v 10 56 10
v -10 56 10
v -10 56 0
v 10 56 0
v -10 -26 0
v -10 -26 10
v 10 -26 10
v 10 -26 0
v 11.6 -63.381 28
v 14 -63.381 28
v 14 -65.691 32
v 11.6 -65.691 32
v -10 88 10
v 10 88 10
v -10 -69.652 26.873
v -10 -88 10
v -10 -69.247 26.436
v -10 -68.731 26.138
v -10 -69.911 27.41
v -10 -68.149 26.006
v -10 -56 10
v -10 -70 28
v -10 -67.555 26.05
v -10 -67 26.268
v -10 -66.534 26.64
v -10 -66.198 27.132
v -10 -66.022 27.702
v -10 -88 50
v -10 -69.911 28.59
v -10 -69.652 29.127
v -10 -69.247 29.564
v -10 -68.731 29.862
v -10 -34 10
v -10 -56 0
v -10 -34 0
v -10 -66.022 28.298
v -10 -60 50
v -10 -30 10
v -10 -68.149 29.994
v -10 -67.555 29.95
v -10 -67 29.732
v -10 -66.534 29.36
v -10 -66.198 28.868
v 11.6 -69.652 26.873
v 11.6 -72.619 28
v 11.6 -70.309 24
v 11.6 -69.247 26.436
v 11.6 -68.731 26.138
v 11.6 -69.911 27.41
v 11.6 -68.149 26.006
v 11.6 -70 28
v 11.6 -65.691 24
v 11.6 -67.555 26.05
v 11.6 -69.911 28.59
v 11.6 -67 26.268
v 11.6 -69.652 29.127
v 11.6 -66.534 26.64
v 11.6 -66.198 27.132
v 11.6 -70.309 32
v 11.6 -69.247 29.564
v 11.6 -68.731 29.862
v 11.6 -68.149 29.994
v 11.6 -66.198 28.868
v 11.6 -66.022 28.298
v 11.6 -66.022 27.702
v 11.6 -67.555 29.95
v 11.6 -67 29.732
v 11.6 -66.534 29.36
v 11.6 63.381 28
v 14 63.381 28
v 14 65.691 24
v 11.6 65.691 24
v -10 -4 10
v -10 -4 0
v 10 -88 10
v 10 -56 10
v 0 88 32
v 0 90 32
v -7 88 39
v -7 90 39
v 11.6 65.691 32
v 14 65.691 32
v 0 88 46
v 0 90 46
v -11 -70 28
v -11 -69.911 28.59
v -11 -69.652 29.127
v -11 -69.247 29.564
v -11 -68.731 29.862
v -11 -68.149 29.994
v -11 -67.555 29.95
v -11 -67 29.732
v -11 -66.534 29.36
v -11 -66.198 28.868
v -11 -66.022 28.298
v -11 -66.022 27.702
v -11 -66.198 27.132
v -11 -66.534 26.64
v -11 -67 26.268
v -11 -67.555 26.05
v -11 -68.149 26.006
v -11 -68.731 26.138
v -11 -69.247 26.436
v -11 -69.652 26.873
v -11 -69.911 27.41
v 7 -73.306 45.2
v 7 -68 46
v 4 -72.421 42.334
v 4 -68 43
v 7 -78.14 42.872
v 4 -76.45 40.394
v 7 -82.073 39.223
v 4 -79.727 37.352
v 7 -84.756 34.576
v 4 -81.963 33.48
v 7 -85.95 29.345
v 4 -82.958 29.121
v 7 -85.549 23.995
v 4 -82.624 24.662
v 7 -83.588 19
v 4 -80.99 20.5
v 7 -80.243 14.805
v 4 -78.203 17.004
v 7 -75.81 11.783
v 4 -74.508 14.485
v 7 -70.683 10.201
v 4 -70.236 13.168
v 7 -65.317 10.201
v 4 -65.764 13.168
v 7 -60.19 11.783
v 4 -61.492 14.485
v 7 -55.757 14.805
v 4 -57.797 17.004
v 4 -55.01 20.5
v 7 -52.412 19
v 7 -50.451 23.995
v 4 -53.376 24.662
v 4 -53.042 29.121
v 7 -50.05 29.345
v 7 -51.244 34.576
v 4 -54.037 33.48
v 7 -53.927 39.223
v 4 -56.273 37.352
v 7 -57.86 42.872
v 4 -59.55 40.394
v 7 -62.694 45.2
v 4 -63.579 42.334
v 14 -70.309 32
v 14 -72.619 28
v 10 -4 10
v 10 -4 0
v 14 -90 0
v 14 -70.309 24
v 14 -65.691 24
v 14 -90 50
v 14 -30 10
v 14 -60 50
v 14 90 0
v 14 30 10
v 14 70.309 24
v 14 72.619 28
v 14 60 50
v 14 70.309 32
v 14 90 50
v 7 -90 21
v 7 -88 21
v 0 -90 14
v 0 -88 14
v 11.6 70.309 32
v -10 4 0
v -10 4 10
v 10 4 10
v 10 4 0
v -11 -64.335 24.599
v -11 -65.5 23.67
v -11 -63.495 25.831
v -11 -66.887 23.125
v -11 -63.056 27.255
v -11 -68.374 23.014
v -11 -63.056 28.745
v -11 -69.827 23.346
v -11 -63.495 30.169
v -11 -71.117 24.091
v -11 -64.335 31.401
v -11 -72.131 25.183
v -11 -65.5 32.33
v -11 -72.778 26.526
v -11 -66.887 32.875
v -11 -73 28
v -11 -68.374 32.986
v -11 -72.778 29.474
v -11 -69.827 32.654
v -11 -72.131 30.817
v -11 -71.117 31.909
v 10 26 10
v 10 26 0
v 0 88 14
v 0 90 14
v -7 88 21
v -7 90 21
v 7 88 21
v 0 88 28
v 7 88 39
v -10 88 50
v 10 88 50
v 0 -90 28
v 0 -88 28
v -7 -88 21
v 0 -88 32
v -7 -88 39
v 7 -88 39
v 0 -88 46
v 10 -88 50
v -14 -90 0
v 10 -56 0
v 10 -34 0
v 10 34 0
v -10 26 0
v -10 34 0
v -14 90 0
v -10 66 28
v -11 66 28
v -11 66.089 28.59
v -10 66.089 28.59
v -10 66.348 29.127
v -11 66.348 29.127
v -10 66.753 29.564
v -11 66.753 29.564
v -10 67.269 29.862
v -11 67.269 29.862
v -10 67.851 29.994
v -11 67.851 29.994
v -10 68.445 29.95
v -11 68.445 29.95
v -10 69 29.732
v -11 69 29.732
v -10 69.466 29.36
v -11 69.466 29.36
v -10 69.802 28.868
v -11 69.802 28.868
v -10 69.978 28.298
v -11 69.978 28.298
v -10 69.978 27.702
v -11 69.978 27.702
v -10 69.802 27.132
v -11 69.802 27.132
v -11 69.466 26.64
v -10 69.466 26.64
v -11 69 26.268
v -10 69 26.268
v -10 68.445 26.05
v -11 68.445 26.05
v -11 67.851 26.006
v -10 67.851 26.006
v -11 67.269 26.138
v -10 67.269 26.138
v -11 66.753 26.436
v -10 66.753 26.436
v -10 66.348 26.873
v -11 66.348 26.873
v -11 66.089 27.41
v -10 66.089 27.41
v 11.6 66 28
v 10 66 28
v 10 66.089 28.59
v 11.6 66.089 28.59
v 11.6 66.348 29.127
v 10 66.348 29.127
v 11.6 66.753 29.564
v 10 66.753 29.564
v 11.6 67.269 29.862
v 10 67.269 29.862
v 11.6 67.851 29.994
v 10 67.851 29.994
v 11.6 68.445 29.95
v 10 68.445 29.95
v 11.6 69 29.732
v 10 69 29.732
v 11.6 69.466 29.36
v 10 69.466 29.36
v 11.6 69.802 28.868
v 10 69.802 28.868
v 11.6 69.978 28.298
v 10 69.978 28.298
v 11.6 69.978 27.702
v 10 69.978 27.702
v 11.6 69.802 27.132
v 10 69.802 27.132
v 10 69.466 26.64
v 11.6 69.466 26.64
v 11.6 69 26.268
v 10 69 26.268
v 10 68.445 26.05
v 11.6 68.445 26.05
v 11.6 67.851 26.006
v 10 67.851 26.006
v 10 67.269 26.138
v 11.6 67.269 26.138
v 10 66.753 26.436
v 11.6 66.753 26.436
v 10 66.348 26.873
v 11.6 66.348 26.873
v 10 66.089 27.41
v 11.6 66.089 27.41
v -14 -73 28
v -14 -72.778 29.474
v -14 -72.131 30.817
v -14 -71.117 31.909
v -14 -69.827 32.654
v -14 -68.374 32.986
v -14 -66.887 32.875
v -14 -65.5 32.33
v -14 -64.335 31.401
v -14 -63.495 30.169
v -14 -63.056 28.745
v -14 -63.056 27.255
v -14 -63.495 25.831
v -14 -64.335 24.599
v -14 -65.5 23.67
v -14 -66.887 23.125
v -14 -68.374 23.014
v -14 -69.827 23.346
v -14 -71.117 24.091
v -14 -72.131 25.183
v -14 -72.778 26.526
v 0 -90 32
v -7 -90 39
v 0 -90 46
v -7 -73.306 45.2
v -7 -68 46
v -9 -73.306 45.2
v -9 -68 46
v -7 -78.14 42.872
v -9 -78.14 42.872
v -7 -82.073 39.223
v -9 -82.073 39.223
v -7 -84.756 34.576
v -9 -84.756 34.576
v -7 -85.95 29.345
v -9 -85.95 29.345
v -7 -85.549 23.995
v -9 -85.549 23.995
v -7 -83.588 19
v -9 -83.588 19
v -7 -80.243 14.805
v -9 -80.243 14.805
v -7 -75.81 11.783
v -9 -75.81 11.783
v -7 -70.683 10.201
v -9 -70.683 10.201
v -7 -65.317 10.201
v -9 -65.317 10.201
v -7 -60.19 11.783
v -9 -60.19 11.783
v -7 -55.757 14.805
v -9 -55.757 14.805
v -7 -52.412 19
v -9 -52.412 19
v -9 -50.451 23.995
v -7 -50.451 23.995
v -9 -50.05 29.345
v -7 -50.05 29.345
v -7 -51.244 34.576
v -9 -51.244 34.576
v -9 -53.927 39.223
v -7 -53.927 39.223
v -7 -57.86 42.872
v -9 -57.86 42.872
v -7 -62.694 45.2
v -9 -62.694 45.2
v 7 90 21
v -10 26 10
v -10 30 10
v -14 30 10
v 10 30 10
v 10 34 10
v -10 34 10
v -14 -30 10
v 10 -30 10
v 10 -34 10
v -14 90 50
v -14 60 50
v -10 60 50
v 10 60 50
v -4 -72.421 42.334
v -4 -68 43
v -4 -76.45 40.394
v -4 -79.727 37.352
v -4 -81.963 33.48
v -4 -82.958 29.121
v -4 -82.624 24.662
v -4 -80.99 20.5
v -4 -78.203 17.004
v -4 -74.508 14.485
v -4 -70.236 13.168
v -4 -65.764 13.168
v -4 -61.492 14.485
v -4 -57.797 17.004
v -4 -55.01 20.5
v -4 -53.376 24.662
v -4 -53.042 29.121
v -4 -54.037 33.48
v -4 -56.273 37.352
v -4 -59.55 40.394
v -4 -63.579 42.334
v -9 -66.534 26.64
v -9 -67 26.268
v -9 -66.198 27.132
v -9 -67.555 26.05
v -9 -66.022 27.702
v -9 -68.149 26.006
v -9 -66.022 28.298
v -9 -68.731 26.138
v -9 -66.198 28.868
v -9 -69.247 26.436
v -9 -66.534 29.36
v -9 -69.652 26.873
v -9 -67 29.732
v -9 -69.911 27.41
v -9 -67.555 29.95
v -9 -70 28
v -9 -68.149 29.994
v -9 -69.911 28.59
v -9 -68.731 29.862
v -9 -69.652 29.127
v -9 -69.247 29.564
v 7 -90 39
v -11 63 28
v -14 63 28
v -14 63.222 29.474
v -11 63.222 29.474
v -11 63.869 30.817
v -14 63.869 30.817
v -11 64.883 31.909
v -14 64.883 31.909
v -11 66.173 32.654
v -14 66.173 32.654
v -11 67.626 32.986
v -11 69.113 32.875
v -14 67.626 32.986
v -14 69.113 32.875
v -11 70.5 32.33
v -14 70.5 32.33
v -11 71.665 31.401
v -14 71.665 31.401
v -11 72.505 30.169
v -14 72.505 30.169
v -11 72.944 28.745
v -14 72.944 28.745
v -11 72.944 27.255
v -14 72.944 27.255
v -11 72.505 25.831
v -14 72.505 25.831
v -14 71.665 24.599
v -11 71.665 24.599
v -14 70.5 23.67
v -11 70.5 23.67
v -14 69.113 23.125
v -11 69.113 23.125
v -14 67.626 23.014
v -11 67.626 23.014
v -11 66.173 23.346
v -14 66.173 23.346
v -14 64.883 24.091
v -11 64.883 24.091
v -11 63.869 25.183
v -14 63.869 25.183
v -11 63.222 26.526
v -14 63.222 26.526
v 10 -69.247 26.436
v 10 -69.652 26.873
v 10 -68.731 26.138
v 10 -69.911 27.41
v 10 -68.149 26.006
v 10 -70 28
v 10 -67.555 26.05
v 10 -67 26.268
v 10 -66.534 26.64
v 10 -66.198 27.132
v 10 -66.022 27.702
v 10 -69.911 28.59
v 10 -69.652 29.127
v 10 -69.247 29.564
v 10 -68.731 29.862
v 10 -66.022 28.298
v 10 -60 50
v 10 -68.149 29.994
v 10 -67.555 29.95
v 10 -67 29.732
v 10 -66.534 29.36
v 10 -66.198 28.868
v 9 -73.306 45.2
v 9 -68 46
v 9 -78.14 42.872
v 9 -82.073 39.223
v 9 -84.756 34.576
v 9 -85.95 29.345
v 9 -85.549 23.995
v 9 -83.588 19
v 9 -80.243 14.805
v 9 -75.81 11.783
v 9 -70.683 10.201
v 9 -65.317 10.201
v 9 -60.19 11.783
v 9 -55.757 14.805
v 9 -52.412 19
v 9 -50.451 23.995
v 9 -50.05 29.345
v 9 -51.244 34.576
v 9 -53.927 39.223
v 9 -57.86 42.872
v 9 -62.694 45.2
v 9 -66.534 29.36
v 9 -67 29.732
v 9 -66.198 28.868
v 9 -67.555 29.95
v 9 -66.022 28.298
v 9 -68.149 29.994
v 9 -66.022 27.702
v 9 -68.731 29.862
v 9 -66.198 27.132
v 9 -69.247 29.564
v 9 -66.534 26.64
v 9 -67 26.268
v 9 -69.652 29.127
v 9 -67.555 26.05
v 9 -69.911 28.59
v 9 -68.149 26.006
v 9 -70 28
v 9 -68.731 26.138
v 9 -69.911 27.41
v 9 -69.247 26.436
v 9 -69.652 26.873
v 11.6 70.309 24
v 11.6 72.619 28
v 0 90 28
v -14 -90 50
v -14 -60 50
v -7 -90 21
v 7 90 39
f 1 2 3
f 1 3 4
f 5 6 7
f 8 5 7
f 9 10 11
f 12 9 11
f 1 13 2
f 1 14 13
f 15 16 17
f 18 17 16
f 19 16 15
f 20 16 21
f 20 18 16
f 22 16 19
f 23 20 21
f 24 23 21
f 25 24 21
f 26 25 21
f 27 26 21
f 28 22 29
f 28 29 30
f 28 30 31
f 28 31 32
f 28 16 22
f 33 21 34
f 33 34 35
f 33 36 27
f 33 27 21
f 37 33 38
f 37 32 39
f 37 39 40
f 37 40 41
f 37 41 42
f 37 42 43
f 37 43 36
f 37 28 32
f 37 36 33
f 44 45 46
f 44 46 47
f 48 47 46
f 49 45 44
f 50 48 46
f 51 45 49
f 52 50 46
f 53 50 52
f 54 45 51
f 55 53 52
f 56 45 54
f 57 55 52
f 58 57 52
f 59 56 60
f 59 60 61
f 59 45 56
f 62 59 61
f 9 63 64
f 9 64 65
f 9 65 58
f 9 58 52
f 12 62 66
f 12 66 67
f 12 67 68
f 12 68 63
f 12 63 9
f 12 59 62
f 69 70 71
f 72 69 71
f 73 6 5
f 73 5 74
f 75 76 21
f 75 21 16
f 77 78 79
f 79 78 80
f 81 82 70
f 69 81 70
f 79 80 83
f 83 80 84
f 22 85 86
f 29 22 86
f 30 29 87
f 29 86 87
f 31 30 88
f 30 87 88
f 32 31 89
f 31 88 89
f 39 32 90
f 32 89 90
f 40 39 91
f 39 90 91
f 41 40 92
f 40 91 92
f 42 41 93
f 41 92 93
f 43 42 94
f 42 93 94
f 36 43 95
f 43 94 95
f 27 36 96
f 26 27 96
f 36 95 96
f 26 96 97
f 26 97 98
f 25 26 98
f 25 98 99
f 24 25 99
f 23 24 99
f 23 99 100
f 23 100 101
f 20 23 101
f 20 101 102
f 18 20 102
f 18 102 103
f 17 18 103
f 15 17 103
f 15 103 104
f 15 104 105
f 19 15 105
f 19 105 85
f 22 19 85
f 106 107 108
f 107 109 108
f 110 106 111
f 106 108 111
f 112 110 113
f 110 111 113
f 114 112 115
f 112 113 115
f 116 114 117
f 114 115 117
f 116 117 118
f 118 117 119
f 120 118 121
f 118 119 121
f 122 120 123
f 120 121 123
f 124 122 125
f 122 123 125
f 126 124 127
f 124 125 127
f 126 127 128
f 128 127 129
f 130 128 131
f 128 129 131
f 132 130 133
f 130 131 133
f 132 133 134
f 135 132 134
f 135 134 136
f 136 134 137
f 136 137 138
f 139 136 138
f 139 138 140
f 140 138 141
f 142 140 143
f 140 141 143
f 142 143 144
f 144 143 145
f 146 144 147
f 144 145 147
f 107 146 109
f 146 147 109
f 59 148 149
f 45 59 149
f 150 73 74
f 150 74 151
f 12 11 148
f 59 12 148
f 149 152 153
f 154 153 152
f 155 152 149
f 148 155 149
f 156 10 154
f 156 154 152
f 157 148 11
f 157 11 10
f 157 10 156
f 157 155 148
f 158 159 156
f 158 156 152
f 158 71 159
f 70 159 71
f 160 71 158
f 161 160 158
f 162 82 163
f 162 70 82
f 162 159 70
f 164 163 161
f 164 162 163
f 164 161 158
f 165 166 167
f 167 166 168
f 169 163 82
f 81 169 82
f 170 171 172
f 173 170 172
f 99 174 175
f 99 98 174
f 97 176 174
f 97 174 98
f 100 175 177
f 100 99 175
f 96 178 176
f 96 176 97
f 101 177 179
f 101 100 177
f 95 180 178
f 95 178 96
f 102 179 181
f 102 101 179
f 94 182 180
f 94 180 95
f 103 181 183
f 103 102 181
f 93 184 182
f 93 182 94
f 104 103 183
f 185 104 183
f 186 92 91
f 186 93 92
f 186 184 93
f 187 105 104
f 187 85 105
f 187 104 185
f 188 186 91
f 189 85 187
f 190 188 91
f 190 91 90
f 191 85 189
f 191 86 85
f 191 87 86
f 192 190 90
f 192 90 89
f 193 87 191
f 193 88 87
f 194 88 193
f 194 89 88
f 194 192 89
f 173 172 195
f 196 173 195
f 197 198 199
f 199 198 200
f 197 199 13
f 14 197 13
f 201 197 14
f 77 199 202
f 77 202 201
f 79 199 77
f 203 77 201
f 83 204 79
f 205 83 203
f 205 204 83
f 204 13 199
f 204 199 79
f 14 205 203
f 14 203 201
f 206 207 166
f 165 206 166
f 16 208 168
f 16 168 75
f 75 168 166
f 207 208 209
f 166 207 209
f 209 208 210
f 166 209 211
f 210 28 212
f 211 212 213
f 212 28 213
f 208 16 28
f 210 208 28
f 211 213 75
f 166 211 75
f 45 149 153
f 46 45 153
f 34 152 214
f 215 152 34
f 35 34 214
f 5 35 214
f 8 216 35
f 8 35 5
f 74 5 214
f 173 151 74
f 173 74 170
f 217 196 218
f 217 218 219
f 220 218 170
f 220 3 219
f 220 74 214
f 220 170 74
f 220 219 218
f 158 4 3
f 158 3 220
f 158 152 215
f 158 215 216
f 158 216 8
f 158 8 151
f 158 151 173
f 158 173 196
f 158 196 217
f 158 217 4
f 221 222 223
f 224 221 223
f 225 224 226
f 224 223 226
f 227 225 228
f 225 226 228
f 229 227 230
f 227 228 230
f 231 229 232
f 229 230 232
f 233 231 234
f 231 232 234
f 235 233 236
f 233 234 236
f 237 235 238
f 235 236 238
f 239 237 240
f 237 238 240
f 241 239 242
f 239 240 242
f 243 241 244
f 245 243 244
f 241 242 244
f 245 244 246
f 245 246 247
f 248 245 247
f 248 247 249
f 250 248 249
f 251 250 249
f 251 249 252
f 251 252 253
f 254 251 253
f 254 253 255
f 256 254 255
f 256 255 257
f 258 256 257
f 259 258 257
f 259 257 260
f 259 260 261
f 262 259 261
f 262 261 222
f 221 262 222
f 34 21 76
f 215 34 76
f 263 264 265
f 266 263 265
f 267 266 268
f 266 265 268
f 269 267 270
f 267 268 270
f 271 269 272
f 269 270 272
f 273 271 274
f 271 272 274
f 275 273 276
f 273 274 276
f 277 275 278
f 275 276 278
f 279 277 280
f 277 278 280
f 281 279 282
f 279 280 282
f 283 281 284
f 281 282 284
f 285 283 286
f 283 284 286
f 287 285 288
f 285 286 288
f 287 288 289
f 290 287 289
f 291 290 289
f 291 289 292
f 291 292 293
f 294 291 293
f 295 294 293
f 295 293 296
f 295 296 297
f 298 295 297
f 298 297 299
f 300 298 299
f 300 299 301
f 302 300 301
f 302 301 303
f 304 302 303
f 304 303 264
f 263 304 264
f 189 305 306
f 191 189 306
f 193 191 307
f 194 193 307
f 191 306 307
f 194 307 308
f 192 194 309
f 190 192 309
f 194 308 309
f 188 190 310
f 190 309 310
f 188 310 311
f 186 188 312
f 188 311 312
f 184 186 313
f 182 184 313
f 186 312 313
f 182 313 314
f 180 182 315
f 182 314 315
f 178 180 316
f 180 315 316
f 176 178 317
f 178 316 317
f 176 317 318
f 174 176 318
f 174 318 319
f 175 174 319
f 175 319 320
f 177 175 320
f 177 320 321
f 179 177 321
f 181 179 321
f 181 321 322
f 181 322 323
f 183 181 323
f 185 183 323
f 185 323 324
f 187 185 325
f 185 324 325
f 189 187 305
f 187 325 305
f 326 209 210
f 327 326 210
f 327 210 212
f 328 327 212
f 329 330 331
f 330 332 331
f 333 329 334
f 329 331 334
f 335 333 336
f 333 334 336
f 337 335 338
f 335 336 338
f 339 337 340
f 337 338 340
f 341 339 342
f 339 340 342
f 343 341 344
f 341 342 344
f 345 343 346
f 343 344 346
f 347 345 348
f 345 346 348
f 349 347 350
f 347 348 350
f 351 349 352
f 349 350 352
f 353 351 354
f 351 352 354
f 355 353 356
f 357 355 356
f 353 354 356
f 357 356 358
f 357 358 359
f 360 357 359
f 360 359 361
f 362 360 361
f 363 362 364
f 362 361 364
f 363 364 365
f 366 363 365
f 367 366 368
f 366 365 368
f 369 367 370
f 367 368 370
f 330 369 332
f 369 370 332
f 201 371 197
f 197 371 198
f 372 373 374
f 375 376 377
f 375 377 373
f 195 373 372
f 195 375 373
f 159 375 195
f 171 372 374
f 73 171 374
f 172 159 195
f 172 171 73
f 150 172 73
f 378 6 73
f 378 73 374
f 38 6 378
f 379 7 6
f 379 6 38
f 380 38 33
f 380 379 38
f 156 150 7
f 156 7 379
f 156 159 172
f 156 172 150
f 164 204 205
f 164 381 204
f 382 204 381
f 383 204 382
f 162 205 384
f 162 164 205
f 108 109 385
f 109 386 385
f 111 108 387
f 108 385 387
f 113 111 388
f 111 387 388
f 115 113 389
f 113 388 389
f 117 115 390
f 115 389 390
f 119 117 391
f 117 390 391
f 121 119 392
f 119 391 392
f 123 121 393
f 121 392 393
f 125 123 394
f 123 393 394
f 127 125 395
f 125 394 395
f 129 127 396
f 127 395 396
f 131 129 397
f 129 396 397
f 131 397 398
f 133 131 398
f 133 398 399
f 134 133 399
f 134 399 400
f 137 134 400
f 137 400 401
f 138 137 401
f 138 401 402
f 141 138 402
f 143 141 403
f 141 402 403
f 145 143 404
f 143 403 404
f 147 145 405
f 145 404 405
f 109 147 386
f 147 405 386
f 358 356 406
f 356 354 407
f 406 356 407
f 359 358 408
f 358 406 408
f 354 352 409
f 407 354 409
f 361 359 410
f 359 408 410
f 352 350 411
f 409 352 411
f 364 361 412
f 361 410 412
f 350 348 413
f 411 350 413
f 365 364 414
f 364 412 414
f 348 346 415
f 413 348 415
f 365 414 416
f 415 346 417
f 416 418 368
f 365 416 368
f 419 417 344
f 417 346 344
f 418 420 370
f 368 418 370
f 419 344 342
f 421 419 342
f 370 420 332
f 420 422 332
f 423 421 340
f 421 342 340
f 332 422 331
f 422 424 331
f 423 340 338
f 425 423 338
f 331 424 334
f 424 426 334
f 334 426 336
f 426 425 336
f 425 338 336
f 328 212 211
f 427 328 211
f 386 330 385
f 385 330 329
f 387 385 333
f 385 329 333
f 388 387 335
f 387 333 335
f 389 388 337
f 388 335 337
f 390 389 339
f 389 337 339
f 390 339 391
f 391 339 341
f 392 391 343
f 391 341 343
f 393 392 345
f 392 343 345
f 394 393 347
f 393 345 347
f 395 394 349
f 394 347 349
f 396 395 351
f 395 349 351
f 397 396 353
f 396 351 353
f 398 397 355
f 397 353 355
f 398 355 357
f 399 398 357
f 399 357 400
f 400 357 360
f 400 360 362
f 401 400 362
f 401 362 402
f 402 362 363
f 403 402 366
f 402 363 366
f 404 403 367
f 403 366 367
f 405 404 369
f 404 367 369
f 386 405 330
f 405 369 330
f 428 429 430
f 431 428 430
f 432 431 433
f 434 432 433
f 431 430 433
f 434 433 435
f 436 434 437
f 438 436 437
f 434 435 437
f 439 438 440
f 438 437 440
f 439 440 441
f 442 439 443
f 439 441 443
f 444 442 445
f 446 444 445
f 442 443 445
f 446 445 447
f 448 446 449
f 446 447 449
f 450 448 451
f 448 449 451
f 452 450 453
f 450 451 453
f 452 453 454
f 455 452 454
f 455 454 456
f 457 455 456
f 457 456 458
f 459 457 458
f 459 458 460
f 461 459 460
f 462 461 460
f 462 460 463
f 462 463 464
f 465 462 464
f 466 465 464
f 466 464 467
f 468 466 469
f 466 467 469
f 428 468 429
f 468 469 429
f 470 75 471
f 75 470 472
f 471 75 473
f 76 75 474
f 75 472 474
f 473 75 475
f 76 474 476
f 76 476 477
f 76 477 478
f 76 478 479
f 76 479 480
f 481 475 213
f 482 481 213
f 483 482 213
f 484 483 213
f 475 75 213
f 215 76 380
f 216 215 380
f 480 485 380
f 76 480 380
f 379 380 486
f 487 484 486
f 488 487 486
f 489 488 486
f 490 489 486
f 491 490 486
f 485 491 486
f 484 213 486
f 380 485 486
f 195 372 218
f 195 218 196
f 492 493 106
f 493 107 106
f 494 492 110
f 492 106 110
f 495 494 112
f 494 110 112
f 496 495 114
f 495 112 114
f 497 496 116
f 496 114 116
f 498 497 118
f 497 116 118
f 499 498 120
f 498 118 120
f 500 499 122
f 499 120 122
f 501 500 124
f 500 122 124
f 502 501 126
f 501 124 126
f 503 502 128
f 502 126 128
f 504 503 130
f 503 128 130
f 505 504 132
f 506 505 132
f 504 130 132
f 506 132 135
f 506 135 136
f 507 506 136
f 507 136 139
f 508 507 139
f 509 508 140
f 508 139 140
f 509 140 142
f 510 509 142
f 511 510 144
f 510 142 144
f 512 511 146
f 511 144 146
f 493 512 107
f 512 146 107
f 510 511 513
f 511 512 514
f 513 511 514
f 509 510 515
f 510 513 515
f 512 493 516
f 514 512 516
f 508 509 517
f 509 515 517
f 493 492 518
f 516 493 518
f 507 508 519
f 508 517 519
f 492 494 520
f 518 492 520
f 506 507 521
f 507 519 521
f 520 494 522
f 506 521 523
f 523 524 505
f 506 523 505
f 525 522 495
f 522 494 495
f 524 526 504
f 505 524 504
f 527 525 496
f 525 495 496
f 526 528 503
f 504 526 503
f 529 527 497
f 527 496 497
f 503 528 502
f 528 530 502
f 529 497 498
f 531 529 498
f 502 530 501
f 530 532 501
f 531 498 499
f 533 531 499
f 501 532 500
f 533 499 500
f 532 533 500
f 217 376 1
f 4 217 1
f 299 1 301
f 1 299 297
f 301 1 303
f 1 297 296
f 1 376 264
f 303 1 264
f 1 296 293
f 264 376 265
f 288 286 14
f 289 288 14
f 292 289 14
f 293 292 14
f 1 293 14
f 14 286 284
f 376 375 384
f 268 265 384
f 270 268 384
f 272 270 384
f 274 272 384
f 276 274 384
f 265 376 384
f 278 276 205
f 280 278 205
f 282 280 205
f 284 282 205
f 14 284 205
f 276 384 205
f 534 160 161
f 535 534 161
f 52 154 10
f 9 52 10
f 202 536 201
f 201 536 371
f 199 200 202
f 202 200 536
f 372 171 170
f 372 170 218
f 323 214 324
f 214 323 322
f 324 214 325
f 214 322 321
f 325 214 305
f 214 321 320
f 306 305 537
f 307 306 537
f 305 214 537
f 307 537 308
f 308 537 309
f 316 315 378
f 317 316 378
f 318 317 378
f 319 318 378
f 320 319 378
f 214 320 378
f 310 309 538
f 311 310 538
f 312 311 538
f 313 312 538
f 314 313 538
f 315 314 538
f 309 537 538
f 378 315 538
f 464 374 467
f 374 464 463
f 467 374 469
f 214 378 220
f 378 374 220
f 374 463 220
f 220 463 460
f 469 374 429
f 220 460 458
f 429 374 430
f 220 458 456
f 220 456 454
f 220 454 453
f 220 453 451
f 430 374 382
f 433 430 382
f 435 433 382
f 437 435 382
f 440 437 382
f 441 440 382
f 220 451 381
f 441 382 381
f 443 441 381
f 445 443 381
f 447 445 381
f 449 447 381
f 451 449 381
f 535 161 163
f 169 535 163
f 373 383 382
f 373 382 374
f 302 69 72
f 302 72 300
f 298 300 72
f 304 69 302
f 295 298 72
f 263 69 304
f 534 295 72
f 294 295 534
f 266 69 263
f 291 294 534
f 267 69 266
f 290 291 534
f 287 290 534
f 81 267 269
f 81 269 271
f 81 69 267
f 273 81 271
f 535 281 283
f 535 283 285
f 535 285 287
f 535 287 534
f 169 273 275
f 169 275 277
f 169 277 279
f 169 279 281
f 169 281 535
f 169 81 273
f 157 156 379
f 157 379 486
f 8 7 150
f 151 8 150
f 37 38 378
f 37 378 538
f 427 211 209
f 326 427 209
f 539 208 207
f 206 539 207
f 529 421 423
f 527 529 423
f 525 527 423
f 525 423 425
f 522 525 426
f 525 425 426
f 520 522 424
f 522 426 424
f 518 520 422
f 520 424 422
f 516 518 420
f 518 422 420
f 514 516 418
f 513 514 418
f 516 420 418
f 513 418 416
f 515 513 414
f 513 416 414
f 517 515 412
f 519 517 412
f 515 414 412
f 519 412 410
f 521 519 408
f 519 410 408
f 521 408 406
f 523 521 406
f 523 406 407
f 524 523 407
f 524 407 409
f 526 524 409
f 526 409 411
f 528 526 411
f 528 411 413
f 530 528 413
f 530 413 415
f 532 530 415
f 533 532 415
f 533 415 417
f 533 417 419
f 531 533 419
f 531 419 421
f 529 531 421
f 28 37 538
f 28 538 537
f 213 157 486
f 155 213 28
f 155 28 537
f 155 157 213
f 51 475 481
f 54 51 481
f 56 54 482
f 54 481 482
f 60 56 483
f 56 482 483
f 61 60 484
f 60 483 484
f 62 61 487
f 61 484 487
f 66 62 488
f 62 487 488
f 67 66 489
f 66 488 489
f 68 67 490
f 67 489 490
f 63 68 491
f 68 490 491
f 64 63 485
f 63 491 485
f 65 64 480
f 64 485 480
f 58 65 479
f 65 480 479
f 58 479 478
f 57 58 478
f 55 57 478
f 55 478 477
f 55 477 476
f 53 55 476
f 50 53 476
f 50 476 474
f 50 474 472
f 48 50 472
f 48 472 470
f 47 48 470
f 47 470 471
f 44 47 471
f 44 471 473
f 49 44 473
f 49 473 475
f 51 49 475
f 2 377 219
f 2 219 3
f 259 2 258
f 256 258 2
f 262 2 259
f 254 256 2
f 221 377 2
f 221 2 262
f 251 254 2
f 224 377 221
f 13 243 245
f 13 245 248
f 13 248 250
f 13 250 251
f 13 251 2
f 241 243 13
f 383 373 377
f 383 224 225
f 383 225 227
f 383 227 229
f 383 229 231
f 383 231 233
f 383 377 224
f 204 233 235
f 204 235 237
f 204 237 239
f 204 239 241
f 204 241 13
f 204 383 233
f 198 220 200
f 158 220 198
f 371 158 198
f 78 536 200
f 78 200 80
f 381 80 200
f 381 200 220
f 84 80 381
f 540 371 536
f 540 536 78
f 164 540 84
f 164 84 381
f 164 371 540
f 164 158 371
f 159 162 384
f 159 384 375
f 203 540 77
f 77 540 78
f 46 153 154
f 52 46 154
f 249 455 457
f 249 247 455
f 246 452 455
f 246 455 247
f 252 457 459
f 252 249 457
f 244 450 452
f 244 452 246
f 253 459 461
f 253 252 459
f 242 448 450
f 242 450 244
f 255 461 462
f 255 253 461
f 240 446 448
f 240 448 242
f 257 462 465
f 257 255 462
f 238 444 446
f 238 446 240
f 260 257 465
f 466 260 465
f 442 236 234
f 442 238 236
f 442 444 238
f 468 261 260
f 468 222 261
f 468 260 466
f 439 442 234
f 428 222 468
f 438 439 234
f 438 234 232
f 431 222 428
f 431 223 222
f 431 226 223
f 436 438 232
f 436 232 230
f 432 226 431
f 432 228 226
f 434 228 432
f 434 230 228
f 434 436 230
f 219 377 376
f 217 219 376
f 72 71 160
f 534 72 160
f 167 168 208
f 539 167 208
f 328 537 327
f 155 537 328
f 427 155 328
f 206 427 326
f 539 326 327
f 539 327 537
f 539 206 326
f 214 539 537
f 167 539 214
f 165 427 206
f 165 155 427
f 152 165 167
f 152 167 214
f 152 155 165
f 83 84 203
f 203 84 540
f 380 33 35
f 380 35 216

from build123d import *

# Parameters (mm, degrees)
F0_R      = 15
F1_DEPTH  = 14
F2_W      = 20
F2_H      = 30
F3_DEPTH  = 40
F2_H_2    = 58
F2_H_3    = 28
F4_DEPTH  = 40
F9_D      = 4
F9_2_D    = 4
F10_W     = 20
F10_H     = 22
F11_DEPTH = 10
F12_DEPTH = 2.4
F13_R     = 5
F14_DEPTH = 3
F16_DEPTH = 180.001


with BuildPart() as f1:
    # F0 (on Right) → F1 (new body, symmetric)
    with BuildSketch(Plane.YZ):
        Polygon((-90, 0), (0, 0), (90, 0), (90, 50), (60, 50), (30, 10), (0, 10), (-30, 10), (-60, 50), (-90, 50), align=None)
        with Locations((-68, 28)):
            Circle(F0_R, mode=Mode.SUBTRACT)
        with Locations((-68, 28)):
            Circle(F0_R)
    extrude(amount=F1_DEPTH, both=True)

    # F2 (on face) → F3 (cut, through all)
    with BuildSketch(Plane.XY.offset(50)):
        with Locations((0, -45)):
            Rectangle(F2_W, F2_H)
    extrude(amount=-F3_DEPTH, mode=Mode.SUBTRACT)

    # F2 (on face) → F4 (cut, through all)
    with BuildSketch(Plane.XY.offset(50)):
        with Locations((0, 59)):
            Rectangle(F2_W, F2_H_2)
        with Locations((0, -74)):
            Rectangle(F2_W, F2_H_3)
    extrude(amount=-F4_DEPTH, mode=Mode.SUBTRACT)

    # F9 (through all)
    with Locations(Plane.YZ.offset(14)):
        with Locations((-68, 28), (68, 28)):
            Hole(F9_D / 2)

    # F10 (on face) → F11 (cut, through all)
    with BuildSketch(Plane.XY.offset(10)):
        with Locations((0, 15)):
            Rectangle(F10_W, F10_H)
        with Locations((0, -15)):
            Rectangle(F10_W, F10_H)
        with Locations((0, -45)):
            Rectangle(F10_W, F10_H)
        with Locations((0, 45)):
            Rectangle(F10_W, F10_H)
    extrude(amount=-F11_DEPTH, mode=Mode.SUBTRACT)

    # F8 (on face) → F12 (cut, through all)
    with BuildSketch(Plane.YZ.offset(14)):
        Polygon((-70.3094010768, 24), (-65.6905989232, 24), (-63.3811978465, 28), (-65.6905989232, 32), (-70.3094010768, 32), (-72.6188021535, 28), align=None)
        Polygon((70.3094010768, 32), (65.6905989232, 32), (63.3811978465, 28), (65.6905989232, 24), (70.3094010768, 24), (72.6188021535, 28), align=None)
    extrude(amount=-F12_DEPTH, mode=Mode.SUBTRACT)

    # F13 (on face) → F14 (cut)
    with BuildSketch(Plane(origin=(-14, 0, 0), x_dir=(0, -1, 0), z_dir=(-1, 0, 0))):
        with Locations((68, 28)):
            Circle(F13_R)
        with Locations((-68, 28)):
            Circle(F13_R)
    extrude(amount=-F14_DEPTH, mode=Mode.SUBTRACT)

    # F15 (on face) → F16 (cut, through all)
    with BuildSketch(Plane(origin=(0, 90, 0), x_dir=(-1, 0, 0), z_dir=(0, 1, 0))):
        Polygon((-7, 39), (0, 32), (7, 39), (0, 46), align=None)
        Polygon((7, 21), (0, 28), (-7, 21), (0, 14), align=None)
    extrude(amount=-F16_DEPTH, mode=Mode.SUBTRACT)


with BuildPart() as f7:
    # F6 (on plane+point) → F7 (revolve)
    with BuildSketch(Plane.XZ.offset(68)):
        Polygon((4, 43), (0, 43), (-4, 43), (-7, 46), (-9, 46), (-9, 28), (0, 28), (9, 28), (9, 46), (7, 46), align=None)
    revolve(axis=Axis((-4.5, -68, 28), (1, 0, 0)))

    # F9#2 (through all)
    with Locations(Plane.YZ.offset(14)):
        with Locations((-68, 28), (68, 28)):
            Hole(F9_2_D / 2)


solid = Compound([f1.part, f7.part])
